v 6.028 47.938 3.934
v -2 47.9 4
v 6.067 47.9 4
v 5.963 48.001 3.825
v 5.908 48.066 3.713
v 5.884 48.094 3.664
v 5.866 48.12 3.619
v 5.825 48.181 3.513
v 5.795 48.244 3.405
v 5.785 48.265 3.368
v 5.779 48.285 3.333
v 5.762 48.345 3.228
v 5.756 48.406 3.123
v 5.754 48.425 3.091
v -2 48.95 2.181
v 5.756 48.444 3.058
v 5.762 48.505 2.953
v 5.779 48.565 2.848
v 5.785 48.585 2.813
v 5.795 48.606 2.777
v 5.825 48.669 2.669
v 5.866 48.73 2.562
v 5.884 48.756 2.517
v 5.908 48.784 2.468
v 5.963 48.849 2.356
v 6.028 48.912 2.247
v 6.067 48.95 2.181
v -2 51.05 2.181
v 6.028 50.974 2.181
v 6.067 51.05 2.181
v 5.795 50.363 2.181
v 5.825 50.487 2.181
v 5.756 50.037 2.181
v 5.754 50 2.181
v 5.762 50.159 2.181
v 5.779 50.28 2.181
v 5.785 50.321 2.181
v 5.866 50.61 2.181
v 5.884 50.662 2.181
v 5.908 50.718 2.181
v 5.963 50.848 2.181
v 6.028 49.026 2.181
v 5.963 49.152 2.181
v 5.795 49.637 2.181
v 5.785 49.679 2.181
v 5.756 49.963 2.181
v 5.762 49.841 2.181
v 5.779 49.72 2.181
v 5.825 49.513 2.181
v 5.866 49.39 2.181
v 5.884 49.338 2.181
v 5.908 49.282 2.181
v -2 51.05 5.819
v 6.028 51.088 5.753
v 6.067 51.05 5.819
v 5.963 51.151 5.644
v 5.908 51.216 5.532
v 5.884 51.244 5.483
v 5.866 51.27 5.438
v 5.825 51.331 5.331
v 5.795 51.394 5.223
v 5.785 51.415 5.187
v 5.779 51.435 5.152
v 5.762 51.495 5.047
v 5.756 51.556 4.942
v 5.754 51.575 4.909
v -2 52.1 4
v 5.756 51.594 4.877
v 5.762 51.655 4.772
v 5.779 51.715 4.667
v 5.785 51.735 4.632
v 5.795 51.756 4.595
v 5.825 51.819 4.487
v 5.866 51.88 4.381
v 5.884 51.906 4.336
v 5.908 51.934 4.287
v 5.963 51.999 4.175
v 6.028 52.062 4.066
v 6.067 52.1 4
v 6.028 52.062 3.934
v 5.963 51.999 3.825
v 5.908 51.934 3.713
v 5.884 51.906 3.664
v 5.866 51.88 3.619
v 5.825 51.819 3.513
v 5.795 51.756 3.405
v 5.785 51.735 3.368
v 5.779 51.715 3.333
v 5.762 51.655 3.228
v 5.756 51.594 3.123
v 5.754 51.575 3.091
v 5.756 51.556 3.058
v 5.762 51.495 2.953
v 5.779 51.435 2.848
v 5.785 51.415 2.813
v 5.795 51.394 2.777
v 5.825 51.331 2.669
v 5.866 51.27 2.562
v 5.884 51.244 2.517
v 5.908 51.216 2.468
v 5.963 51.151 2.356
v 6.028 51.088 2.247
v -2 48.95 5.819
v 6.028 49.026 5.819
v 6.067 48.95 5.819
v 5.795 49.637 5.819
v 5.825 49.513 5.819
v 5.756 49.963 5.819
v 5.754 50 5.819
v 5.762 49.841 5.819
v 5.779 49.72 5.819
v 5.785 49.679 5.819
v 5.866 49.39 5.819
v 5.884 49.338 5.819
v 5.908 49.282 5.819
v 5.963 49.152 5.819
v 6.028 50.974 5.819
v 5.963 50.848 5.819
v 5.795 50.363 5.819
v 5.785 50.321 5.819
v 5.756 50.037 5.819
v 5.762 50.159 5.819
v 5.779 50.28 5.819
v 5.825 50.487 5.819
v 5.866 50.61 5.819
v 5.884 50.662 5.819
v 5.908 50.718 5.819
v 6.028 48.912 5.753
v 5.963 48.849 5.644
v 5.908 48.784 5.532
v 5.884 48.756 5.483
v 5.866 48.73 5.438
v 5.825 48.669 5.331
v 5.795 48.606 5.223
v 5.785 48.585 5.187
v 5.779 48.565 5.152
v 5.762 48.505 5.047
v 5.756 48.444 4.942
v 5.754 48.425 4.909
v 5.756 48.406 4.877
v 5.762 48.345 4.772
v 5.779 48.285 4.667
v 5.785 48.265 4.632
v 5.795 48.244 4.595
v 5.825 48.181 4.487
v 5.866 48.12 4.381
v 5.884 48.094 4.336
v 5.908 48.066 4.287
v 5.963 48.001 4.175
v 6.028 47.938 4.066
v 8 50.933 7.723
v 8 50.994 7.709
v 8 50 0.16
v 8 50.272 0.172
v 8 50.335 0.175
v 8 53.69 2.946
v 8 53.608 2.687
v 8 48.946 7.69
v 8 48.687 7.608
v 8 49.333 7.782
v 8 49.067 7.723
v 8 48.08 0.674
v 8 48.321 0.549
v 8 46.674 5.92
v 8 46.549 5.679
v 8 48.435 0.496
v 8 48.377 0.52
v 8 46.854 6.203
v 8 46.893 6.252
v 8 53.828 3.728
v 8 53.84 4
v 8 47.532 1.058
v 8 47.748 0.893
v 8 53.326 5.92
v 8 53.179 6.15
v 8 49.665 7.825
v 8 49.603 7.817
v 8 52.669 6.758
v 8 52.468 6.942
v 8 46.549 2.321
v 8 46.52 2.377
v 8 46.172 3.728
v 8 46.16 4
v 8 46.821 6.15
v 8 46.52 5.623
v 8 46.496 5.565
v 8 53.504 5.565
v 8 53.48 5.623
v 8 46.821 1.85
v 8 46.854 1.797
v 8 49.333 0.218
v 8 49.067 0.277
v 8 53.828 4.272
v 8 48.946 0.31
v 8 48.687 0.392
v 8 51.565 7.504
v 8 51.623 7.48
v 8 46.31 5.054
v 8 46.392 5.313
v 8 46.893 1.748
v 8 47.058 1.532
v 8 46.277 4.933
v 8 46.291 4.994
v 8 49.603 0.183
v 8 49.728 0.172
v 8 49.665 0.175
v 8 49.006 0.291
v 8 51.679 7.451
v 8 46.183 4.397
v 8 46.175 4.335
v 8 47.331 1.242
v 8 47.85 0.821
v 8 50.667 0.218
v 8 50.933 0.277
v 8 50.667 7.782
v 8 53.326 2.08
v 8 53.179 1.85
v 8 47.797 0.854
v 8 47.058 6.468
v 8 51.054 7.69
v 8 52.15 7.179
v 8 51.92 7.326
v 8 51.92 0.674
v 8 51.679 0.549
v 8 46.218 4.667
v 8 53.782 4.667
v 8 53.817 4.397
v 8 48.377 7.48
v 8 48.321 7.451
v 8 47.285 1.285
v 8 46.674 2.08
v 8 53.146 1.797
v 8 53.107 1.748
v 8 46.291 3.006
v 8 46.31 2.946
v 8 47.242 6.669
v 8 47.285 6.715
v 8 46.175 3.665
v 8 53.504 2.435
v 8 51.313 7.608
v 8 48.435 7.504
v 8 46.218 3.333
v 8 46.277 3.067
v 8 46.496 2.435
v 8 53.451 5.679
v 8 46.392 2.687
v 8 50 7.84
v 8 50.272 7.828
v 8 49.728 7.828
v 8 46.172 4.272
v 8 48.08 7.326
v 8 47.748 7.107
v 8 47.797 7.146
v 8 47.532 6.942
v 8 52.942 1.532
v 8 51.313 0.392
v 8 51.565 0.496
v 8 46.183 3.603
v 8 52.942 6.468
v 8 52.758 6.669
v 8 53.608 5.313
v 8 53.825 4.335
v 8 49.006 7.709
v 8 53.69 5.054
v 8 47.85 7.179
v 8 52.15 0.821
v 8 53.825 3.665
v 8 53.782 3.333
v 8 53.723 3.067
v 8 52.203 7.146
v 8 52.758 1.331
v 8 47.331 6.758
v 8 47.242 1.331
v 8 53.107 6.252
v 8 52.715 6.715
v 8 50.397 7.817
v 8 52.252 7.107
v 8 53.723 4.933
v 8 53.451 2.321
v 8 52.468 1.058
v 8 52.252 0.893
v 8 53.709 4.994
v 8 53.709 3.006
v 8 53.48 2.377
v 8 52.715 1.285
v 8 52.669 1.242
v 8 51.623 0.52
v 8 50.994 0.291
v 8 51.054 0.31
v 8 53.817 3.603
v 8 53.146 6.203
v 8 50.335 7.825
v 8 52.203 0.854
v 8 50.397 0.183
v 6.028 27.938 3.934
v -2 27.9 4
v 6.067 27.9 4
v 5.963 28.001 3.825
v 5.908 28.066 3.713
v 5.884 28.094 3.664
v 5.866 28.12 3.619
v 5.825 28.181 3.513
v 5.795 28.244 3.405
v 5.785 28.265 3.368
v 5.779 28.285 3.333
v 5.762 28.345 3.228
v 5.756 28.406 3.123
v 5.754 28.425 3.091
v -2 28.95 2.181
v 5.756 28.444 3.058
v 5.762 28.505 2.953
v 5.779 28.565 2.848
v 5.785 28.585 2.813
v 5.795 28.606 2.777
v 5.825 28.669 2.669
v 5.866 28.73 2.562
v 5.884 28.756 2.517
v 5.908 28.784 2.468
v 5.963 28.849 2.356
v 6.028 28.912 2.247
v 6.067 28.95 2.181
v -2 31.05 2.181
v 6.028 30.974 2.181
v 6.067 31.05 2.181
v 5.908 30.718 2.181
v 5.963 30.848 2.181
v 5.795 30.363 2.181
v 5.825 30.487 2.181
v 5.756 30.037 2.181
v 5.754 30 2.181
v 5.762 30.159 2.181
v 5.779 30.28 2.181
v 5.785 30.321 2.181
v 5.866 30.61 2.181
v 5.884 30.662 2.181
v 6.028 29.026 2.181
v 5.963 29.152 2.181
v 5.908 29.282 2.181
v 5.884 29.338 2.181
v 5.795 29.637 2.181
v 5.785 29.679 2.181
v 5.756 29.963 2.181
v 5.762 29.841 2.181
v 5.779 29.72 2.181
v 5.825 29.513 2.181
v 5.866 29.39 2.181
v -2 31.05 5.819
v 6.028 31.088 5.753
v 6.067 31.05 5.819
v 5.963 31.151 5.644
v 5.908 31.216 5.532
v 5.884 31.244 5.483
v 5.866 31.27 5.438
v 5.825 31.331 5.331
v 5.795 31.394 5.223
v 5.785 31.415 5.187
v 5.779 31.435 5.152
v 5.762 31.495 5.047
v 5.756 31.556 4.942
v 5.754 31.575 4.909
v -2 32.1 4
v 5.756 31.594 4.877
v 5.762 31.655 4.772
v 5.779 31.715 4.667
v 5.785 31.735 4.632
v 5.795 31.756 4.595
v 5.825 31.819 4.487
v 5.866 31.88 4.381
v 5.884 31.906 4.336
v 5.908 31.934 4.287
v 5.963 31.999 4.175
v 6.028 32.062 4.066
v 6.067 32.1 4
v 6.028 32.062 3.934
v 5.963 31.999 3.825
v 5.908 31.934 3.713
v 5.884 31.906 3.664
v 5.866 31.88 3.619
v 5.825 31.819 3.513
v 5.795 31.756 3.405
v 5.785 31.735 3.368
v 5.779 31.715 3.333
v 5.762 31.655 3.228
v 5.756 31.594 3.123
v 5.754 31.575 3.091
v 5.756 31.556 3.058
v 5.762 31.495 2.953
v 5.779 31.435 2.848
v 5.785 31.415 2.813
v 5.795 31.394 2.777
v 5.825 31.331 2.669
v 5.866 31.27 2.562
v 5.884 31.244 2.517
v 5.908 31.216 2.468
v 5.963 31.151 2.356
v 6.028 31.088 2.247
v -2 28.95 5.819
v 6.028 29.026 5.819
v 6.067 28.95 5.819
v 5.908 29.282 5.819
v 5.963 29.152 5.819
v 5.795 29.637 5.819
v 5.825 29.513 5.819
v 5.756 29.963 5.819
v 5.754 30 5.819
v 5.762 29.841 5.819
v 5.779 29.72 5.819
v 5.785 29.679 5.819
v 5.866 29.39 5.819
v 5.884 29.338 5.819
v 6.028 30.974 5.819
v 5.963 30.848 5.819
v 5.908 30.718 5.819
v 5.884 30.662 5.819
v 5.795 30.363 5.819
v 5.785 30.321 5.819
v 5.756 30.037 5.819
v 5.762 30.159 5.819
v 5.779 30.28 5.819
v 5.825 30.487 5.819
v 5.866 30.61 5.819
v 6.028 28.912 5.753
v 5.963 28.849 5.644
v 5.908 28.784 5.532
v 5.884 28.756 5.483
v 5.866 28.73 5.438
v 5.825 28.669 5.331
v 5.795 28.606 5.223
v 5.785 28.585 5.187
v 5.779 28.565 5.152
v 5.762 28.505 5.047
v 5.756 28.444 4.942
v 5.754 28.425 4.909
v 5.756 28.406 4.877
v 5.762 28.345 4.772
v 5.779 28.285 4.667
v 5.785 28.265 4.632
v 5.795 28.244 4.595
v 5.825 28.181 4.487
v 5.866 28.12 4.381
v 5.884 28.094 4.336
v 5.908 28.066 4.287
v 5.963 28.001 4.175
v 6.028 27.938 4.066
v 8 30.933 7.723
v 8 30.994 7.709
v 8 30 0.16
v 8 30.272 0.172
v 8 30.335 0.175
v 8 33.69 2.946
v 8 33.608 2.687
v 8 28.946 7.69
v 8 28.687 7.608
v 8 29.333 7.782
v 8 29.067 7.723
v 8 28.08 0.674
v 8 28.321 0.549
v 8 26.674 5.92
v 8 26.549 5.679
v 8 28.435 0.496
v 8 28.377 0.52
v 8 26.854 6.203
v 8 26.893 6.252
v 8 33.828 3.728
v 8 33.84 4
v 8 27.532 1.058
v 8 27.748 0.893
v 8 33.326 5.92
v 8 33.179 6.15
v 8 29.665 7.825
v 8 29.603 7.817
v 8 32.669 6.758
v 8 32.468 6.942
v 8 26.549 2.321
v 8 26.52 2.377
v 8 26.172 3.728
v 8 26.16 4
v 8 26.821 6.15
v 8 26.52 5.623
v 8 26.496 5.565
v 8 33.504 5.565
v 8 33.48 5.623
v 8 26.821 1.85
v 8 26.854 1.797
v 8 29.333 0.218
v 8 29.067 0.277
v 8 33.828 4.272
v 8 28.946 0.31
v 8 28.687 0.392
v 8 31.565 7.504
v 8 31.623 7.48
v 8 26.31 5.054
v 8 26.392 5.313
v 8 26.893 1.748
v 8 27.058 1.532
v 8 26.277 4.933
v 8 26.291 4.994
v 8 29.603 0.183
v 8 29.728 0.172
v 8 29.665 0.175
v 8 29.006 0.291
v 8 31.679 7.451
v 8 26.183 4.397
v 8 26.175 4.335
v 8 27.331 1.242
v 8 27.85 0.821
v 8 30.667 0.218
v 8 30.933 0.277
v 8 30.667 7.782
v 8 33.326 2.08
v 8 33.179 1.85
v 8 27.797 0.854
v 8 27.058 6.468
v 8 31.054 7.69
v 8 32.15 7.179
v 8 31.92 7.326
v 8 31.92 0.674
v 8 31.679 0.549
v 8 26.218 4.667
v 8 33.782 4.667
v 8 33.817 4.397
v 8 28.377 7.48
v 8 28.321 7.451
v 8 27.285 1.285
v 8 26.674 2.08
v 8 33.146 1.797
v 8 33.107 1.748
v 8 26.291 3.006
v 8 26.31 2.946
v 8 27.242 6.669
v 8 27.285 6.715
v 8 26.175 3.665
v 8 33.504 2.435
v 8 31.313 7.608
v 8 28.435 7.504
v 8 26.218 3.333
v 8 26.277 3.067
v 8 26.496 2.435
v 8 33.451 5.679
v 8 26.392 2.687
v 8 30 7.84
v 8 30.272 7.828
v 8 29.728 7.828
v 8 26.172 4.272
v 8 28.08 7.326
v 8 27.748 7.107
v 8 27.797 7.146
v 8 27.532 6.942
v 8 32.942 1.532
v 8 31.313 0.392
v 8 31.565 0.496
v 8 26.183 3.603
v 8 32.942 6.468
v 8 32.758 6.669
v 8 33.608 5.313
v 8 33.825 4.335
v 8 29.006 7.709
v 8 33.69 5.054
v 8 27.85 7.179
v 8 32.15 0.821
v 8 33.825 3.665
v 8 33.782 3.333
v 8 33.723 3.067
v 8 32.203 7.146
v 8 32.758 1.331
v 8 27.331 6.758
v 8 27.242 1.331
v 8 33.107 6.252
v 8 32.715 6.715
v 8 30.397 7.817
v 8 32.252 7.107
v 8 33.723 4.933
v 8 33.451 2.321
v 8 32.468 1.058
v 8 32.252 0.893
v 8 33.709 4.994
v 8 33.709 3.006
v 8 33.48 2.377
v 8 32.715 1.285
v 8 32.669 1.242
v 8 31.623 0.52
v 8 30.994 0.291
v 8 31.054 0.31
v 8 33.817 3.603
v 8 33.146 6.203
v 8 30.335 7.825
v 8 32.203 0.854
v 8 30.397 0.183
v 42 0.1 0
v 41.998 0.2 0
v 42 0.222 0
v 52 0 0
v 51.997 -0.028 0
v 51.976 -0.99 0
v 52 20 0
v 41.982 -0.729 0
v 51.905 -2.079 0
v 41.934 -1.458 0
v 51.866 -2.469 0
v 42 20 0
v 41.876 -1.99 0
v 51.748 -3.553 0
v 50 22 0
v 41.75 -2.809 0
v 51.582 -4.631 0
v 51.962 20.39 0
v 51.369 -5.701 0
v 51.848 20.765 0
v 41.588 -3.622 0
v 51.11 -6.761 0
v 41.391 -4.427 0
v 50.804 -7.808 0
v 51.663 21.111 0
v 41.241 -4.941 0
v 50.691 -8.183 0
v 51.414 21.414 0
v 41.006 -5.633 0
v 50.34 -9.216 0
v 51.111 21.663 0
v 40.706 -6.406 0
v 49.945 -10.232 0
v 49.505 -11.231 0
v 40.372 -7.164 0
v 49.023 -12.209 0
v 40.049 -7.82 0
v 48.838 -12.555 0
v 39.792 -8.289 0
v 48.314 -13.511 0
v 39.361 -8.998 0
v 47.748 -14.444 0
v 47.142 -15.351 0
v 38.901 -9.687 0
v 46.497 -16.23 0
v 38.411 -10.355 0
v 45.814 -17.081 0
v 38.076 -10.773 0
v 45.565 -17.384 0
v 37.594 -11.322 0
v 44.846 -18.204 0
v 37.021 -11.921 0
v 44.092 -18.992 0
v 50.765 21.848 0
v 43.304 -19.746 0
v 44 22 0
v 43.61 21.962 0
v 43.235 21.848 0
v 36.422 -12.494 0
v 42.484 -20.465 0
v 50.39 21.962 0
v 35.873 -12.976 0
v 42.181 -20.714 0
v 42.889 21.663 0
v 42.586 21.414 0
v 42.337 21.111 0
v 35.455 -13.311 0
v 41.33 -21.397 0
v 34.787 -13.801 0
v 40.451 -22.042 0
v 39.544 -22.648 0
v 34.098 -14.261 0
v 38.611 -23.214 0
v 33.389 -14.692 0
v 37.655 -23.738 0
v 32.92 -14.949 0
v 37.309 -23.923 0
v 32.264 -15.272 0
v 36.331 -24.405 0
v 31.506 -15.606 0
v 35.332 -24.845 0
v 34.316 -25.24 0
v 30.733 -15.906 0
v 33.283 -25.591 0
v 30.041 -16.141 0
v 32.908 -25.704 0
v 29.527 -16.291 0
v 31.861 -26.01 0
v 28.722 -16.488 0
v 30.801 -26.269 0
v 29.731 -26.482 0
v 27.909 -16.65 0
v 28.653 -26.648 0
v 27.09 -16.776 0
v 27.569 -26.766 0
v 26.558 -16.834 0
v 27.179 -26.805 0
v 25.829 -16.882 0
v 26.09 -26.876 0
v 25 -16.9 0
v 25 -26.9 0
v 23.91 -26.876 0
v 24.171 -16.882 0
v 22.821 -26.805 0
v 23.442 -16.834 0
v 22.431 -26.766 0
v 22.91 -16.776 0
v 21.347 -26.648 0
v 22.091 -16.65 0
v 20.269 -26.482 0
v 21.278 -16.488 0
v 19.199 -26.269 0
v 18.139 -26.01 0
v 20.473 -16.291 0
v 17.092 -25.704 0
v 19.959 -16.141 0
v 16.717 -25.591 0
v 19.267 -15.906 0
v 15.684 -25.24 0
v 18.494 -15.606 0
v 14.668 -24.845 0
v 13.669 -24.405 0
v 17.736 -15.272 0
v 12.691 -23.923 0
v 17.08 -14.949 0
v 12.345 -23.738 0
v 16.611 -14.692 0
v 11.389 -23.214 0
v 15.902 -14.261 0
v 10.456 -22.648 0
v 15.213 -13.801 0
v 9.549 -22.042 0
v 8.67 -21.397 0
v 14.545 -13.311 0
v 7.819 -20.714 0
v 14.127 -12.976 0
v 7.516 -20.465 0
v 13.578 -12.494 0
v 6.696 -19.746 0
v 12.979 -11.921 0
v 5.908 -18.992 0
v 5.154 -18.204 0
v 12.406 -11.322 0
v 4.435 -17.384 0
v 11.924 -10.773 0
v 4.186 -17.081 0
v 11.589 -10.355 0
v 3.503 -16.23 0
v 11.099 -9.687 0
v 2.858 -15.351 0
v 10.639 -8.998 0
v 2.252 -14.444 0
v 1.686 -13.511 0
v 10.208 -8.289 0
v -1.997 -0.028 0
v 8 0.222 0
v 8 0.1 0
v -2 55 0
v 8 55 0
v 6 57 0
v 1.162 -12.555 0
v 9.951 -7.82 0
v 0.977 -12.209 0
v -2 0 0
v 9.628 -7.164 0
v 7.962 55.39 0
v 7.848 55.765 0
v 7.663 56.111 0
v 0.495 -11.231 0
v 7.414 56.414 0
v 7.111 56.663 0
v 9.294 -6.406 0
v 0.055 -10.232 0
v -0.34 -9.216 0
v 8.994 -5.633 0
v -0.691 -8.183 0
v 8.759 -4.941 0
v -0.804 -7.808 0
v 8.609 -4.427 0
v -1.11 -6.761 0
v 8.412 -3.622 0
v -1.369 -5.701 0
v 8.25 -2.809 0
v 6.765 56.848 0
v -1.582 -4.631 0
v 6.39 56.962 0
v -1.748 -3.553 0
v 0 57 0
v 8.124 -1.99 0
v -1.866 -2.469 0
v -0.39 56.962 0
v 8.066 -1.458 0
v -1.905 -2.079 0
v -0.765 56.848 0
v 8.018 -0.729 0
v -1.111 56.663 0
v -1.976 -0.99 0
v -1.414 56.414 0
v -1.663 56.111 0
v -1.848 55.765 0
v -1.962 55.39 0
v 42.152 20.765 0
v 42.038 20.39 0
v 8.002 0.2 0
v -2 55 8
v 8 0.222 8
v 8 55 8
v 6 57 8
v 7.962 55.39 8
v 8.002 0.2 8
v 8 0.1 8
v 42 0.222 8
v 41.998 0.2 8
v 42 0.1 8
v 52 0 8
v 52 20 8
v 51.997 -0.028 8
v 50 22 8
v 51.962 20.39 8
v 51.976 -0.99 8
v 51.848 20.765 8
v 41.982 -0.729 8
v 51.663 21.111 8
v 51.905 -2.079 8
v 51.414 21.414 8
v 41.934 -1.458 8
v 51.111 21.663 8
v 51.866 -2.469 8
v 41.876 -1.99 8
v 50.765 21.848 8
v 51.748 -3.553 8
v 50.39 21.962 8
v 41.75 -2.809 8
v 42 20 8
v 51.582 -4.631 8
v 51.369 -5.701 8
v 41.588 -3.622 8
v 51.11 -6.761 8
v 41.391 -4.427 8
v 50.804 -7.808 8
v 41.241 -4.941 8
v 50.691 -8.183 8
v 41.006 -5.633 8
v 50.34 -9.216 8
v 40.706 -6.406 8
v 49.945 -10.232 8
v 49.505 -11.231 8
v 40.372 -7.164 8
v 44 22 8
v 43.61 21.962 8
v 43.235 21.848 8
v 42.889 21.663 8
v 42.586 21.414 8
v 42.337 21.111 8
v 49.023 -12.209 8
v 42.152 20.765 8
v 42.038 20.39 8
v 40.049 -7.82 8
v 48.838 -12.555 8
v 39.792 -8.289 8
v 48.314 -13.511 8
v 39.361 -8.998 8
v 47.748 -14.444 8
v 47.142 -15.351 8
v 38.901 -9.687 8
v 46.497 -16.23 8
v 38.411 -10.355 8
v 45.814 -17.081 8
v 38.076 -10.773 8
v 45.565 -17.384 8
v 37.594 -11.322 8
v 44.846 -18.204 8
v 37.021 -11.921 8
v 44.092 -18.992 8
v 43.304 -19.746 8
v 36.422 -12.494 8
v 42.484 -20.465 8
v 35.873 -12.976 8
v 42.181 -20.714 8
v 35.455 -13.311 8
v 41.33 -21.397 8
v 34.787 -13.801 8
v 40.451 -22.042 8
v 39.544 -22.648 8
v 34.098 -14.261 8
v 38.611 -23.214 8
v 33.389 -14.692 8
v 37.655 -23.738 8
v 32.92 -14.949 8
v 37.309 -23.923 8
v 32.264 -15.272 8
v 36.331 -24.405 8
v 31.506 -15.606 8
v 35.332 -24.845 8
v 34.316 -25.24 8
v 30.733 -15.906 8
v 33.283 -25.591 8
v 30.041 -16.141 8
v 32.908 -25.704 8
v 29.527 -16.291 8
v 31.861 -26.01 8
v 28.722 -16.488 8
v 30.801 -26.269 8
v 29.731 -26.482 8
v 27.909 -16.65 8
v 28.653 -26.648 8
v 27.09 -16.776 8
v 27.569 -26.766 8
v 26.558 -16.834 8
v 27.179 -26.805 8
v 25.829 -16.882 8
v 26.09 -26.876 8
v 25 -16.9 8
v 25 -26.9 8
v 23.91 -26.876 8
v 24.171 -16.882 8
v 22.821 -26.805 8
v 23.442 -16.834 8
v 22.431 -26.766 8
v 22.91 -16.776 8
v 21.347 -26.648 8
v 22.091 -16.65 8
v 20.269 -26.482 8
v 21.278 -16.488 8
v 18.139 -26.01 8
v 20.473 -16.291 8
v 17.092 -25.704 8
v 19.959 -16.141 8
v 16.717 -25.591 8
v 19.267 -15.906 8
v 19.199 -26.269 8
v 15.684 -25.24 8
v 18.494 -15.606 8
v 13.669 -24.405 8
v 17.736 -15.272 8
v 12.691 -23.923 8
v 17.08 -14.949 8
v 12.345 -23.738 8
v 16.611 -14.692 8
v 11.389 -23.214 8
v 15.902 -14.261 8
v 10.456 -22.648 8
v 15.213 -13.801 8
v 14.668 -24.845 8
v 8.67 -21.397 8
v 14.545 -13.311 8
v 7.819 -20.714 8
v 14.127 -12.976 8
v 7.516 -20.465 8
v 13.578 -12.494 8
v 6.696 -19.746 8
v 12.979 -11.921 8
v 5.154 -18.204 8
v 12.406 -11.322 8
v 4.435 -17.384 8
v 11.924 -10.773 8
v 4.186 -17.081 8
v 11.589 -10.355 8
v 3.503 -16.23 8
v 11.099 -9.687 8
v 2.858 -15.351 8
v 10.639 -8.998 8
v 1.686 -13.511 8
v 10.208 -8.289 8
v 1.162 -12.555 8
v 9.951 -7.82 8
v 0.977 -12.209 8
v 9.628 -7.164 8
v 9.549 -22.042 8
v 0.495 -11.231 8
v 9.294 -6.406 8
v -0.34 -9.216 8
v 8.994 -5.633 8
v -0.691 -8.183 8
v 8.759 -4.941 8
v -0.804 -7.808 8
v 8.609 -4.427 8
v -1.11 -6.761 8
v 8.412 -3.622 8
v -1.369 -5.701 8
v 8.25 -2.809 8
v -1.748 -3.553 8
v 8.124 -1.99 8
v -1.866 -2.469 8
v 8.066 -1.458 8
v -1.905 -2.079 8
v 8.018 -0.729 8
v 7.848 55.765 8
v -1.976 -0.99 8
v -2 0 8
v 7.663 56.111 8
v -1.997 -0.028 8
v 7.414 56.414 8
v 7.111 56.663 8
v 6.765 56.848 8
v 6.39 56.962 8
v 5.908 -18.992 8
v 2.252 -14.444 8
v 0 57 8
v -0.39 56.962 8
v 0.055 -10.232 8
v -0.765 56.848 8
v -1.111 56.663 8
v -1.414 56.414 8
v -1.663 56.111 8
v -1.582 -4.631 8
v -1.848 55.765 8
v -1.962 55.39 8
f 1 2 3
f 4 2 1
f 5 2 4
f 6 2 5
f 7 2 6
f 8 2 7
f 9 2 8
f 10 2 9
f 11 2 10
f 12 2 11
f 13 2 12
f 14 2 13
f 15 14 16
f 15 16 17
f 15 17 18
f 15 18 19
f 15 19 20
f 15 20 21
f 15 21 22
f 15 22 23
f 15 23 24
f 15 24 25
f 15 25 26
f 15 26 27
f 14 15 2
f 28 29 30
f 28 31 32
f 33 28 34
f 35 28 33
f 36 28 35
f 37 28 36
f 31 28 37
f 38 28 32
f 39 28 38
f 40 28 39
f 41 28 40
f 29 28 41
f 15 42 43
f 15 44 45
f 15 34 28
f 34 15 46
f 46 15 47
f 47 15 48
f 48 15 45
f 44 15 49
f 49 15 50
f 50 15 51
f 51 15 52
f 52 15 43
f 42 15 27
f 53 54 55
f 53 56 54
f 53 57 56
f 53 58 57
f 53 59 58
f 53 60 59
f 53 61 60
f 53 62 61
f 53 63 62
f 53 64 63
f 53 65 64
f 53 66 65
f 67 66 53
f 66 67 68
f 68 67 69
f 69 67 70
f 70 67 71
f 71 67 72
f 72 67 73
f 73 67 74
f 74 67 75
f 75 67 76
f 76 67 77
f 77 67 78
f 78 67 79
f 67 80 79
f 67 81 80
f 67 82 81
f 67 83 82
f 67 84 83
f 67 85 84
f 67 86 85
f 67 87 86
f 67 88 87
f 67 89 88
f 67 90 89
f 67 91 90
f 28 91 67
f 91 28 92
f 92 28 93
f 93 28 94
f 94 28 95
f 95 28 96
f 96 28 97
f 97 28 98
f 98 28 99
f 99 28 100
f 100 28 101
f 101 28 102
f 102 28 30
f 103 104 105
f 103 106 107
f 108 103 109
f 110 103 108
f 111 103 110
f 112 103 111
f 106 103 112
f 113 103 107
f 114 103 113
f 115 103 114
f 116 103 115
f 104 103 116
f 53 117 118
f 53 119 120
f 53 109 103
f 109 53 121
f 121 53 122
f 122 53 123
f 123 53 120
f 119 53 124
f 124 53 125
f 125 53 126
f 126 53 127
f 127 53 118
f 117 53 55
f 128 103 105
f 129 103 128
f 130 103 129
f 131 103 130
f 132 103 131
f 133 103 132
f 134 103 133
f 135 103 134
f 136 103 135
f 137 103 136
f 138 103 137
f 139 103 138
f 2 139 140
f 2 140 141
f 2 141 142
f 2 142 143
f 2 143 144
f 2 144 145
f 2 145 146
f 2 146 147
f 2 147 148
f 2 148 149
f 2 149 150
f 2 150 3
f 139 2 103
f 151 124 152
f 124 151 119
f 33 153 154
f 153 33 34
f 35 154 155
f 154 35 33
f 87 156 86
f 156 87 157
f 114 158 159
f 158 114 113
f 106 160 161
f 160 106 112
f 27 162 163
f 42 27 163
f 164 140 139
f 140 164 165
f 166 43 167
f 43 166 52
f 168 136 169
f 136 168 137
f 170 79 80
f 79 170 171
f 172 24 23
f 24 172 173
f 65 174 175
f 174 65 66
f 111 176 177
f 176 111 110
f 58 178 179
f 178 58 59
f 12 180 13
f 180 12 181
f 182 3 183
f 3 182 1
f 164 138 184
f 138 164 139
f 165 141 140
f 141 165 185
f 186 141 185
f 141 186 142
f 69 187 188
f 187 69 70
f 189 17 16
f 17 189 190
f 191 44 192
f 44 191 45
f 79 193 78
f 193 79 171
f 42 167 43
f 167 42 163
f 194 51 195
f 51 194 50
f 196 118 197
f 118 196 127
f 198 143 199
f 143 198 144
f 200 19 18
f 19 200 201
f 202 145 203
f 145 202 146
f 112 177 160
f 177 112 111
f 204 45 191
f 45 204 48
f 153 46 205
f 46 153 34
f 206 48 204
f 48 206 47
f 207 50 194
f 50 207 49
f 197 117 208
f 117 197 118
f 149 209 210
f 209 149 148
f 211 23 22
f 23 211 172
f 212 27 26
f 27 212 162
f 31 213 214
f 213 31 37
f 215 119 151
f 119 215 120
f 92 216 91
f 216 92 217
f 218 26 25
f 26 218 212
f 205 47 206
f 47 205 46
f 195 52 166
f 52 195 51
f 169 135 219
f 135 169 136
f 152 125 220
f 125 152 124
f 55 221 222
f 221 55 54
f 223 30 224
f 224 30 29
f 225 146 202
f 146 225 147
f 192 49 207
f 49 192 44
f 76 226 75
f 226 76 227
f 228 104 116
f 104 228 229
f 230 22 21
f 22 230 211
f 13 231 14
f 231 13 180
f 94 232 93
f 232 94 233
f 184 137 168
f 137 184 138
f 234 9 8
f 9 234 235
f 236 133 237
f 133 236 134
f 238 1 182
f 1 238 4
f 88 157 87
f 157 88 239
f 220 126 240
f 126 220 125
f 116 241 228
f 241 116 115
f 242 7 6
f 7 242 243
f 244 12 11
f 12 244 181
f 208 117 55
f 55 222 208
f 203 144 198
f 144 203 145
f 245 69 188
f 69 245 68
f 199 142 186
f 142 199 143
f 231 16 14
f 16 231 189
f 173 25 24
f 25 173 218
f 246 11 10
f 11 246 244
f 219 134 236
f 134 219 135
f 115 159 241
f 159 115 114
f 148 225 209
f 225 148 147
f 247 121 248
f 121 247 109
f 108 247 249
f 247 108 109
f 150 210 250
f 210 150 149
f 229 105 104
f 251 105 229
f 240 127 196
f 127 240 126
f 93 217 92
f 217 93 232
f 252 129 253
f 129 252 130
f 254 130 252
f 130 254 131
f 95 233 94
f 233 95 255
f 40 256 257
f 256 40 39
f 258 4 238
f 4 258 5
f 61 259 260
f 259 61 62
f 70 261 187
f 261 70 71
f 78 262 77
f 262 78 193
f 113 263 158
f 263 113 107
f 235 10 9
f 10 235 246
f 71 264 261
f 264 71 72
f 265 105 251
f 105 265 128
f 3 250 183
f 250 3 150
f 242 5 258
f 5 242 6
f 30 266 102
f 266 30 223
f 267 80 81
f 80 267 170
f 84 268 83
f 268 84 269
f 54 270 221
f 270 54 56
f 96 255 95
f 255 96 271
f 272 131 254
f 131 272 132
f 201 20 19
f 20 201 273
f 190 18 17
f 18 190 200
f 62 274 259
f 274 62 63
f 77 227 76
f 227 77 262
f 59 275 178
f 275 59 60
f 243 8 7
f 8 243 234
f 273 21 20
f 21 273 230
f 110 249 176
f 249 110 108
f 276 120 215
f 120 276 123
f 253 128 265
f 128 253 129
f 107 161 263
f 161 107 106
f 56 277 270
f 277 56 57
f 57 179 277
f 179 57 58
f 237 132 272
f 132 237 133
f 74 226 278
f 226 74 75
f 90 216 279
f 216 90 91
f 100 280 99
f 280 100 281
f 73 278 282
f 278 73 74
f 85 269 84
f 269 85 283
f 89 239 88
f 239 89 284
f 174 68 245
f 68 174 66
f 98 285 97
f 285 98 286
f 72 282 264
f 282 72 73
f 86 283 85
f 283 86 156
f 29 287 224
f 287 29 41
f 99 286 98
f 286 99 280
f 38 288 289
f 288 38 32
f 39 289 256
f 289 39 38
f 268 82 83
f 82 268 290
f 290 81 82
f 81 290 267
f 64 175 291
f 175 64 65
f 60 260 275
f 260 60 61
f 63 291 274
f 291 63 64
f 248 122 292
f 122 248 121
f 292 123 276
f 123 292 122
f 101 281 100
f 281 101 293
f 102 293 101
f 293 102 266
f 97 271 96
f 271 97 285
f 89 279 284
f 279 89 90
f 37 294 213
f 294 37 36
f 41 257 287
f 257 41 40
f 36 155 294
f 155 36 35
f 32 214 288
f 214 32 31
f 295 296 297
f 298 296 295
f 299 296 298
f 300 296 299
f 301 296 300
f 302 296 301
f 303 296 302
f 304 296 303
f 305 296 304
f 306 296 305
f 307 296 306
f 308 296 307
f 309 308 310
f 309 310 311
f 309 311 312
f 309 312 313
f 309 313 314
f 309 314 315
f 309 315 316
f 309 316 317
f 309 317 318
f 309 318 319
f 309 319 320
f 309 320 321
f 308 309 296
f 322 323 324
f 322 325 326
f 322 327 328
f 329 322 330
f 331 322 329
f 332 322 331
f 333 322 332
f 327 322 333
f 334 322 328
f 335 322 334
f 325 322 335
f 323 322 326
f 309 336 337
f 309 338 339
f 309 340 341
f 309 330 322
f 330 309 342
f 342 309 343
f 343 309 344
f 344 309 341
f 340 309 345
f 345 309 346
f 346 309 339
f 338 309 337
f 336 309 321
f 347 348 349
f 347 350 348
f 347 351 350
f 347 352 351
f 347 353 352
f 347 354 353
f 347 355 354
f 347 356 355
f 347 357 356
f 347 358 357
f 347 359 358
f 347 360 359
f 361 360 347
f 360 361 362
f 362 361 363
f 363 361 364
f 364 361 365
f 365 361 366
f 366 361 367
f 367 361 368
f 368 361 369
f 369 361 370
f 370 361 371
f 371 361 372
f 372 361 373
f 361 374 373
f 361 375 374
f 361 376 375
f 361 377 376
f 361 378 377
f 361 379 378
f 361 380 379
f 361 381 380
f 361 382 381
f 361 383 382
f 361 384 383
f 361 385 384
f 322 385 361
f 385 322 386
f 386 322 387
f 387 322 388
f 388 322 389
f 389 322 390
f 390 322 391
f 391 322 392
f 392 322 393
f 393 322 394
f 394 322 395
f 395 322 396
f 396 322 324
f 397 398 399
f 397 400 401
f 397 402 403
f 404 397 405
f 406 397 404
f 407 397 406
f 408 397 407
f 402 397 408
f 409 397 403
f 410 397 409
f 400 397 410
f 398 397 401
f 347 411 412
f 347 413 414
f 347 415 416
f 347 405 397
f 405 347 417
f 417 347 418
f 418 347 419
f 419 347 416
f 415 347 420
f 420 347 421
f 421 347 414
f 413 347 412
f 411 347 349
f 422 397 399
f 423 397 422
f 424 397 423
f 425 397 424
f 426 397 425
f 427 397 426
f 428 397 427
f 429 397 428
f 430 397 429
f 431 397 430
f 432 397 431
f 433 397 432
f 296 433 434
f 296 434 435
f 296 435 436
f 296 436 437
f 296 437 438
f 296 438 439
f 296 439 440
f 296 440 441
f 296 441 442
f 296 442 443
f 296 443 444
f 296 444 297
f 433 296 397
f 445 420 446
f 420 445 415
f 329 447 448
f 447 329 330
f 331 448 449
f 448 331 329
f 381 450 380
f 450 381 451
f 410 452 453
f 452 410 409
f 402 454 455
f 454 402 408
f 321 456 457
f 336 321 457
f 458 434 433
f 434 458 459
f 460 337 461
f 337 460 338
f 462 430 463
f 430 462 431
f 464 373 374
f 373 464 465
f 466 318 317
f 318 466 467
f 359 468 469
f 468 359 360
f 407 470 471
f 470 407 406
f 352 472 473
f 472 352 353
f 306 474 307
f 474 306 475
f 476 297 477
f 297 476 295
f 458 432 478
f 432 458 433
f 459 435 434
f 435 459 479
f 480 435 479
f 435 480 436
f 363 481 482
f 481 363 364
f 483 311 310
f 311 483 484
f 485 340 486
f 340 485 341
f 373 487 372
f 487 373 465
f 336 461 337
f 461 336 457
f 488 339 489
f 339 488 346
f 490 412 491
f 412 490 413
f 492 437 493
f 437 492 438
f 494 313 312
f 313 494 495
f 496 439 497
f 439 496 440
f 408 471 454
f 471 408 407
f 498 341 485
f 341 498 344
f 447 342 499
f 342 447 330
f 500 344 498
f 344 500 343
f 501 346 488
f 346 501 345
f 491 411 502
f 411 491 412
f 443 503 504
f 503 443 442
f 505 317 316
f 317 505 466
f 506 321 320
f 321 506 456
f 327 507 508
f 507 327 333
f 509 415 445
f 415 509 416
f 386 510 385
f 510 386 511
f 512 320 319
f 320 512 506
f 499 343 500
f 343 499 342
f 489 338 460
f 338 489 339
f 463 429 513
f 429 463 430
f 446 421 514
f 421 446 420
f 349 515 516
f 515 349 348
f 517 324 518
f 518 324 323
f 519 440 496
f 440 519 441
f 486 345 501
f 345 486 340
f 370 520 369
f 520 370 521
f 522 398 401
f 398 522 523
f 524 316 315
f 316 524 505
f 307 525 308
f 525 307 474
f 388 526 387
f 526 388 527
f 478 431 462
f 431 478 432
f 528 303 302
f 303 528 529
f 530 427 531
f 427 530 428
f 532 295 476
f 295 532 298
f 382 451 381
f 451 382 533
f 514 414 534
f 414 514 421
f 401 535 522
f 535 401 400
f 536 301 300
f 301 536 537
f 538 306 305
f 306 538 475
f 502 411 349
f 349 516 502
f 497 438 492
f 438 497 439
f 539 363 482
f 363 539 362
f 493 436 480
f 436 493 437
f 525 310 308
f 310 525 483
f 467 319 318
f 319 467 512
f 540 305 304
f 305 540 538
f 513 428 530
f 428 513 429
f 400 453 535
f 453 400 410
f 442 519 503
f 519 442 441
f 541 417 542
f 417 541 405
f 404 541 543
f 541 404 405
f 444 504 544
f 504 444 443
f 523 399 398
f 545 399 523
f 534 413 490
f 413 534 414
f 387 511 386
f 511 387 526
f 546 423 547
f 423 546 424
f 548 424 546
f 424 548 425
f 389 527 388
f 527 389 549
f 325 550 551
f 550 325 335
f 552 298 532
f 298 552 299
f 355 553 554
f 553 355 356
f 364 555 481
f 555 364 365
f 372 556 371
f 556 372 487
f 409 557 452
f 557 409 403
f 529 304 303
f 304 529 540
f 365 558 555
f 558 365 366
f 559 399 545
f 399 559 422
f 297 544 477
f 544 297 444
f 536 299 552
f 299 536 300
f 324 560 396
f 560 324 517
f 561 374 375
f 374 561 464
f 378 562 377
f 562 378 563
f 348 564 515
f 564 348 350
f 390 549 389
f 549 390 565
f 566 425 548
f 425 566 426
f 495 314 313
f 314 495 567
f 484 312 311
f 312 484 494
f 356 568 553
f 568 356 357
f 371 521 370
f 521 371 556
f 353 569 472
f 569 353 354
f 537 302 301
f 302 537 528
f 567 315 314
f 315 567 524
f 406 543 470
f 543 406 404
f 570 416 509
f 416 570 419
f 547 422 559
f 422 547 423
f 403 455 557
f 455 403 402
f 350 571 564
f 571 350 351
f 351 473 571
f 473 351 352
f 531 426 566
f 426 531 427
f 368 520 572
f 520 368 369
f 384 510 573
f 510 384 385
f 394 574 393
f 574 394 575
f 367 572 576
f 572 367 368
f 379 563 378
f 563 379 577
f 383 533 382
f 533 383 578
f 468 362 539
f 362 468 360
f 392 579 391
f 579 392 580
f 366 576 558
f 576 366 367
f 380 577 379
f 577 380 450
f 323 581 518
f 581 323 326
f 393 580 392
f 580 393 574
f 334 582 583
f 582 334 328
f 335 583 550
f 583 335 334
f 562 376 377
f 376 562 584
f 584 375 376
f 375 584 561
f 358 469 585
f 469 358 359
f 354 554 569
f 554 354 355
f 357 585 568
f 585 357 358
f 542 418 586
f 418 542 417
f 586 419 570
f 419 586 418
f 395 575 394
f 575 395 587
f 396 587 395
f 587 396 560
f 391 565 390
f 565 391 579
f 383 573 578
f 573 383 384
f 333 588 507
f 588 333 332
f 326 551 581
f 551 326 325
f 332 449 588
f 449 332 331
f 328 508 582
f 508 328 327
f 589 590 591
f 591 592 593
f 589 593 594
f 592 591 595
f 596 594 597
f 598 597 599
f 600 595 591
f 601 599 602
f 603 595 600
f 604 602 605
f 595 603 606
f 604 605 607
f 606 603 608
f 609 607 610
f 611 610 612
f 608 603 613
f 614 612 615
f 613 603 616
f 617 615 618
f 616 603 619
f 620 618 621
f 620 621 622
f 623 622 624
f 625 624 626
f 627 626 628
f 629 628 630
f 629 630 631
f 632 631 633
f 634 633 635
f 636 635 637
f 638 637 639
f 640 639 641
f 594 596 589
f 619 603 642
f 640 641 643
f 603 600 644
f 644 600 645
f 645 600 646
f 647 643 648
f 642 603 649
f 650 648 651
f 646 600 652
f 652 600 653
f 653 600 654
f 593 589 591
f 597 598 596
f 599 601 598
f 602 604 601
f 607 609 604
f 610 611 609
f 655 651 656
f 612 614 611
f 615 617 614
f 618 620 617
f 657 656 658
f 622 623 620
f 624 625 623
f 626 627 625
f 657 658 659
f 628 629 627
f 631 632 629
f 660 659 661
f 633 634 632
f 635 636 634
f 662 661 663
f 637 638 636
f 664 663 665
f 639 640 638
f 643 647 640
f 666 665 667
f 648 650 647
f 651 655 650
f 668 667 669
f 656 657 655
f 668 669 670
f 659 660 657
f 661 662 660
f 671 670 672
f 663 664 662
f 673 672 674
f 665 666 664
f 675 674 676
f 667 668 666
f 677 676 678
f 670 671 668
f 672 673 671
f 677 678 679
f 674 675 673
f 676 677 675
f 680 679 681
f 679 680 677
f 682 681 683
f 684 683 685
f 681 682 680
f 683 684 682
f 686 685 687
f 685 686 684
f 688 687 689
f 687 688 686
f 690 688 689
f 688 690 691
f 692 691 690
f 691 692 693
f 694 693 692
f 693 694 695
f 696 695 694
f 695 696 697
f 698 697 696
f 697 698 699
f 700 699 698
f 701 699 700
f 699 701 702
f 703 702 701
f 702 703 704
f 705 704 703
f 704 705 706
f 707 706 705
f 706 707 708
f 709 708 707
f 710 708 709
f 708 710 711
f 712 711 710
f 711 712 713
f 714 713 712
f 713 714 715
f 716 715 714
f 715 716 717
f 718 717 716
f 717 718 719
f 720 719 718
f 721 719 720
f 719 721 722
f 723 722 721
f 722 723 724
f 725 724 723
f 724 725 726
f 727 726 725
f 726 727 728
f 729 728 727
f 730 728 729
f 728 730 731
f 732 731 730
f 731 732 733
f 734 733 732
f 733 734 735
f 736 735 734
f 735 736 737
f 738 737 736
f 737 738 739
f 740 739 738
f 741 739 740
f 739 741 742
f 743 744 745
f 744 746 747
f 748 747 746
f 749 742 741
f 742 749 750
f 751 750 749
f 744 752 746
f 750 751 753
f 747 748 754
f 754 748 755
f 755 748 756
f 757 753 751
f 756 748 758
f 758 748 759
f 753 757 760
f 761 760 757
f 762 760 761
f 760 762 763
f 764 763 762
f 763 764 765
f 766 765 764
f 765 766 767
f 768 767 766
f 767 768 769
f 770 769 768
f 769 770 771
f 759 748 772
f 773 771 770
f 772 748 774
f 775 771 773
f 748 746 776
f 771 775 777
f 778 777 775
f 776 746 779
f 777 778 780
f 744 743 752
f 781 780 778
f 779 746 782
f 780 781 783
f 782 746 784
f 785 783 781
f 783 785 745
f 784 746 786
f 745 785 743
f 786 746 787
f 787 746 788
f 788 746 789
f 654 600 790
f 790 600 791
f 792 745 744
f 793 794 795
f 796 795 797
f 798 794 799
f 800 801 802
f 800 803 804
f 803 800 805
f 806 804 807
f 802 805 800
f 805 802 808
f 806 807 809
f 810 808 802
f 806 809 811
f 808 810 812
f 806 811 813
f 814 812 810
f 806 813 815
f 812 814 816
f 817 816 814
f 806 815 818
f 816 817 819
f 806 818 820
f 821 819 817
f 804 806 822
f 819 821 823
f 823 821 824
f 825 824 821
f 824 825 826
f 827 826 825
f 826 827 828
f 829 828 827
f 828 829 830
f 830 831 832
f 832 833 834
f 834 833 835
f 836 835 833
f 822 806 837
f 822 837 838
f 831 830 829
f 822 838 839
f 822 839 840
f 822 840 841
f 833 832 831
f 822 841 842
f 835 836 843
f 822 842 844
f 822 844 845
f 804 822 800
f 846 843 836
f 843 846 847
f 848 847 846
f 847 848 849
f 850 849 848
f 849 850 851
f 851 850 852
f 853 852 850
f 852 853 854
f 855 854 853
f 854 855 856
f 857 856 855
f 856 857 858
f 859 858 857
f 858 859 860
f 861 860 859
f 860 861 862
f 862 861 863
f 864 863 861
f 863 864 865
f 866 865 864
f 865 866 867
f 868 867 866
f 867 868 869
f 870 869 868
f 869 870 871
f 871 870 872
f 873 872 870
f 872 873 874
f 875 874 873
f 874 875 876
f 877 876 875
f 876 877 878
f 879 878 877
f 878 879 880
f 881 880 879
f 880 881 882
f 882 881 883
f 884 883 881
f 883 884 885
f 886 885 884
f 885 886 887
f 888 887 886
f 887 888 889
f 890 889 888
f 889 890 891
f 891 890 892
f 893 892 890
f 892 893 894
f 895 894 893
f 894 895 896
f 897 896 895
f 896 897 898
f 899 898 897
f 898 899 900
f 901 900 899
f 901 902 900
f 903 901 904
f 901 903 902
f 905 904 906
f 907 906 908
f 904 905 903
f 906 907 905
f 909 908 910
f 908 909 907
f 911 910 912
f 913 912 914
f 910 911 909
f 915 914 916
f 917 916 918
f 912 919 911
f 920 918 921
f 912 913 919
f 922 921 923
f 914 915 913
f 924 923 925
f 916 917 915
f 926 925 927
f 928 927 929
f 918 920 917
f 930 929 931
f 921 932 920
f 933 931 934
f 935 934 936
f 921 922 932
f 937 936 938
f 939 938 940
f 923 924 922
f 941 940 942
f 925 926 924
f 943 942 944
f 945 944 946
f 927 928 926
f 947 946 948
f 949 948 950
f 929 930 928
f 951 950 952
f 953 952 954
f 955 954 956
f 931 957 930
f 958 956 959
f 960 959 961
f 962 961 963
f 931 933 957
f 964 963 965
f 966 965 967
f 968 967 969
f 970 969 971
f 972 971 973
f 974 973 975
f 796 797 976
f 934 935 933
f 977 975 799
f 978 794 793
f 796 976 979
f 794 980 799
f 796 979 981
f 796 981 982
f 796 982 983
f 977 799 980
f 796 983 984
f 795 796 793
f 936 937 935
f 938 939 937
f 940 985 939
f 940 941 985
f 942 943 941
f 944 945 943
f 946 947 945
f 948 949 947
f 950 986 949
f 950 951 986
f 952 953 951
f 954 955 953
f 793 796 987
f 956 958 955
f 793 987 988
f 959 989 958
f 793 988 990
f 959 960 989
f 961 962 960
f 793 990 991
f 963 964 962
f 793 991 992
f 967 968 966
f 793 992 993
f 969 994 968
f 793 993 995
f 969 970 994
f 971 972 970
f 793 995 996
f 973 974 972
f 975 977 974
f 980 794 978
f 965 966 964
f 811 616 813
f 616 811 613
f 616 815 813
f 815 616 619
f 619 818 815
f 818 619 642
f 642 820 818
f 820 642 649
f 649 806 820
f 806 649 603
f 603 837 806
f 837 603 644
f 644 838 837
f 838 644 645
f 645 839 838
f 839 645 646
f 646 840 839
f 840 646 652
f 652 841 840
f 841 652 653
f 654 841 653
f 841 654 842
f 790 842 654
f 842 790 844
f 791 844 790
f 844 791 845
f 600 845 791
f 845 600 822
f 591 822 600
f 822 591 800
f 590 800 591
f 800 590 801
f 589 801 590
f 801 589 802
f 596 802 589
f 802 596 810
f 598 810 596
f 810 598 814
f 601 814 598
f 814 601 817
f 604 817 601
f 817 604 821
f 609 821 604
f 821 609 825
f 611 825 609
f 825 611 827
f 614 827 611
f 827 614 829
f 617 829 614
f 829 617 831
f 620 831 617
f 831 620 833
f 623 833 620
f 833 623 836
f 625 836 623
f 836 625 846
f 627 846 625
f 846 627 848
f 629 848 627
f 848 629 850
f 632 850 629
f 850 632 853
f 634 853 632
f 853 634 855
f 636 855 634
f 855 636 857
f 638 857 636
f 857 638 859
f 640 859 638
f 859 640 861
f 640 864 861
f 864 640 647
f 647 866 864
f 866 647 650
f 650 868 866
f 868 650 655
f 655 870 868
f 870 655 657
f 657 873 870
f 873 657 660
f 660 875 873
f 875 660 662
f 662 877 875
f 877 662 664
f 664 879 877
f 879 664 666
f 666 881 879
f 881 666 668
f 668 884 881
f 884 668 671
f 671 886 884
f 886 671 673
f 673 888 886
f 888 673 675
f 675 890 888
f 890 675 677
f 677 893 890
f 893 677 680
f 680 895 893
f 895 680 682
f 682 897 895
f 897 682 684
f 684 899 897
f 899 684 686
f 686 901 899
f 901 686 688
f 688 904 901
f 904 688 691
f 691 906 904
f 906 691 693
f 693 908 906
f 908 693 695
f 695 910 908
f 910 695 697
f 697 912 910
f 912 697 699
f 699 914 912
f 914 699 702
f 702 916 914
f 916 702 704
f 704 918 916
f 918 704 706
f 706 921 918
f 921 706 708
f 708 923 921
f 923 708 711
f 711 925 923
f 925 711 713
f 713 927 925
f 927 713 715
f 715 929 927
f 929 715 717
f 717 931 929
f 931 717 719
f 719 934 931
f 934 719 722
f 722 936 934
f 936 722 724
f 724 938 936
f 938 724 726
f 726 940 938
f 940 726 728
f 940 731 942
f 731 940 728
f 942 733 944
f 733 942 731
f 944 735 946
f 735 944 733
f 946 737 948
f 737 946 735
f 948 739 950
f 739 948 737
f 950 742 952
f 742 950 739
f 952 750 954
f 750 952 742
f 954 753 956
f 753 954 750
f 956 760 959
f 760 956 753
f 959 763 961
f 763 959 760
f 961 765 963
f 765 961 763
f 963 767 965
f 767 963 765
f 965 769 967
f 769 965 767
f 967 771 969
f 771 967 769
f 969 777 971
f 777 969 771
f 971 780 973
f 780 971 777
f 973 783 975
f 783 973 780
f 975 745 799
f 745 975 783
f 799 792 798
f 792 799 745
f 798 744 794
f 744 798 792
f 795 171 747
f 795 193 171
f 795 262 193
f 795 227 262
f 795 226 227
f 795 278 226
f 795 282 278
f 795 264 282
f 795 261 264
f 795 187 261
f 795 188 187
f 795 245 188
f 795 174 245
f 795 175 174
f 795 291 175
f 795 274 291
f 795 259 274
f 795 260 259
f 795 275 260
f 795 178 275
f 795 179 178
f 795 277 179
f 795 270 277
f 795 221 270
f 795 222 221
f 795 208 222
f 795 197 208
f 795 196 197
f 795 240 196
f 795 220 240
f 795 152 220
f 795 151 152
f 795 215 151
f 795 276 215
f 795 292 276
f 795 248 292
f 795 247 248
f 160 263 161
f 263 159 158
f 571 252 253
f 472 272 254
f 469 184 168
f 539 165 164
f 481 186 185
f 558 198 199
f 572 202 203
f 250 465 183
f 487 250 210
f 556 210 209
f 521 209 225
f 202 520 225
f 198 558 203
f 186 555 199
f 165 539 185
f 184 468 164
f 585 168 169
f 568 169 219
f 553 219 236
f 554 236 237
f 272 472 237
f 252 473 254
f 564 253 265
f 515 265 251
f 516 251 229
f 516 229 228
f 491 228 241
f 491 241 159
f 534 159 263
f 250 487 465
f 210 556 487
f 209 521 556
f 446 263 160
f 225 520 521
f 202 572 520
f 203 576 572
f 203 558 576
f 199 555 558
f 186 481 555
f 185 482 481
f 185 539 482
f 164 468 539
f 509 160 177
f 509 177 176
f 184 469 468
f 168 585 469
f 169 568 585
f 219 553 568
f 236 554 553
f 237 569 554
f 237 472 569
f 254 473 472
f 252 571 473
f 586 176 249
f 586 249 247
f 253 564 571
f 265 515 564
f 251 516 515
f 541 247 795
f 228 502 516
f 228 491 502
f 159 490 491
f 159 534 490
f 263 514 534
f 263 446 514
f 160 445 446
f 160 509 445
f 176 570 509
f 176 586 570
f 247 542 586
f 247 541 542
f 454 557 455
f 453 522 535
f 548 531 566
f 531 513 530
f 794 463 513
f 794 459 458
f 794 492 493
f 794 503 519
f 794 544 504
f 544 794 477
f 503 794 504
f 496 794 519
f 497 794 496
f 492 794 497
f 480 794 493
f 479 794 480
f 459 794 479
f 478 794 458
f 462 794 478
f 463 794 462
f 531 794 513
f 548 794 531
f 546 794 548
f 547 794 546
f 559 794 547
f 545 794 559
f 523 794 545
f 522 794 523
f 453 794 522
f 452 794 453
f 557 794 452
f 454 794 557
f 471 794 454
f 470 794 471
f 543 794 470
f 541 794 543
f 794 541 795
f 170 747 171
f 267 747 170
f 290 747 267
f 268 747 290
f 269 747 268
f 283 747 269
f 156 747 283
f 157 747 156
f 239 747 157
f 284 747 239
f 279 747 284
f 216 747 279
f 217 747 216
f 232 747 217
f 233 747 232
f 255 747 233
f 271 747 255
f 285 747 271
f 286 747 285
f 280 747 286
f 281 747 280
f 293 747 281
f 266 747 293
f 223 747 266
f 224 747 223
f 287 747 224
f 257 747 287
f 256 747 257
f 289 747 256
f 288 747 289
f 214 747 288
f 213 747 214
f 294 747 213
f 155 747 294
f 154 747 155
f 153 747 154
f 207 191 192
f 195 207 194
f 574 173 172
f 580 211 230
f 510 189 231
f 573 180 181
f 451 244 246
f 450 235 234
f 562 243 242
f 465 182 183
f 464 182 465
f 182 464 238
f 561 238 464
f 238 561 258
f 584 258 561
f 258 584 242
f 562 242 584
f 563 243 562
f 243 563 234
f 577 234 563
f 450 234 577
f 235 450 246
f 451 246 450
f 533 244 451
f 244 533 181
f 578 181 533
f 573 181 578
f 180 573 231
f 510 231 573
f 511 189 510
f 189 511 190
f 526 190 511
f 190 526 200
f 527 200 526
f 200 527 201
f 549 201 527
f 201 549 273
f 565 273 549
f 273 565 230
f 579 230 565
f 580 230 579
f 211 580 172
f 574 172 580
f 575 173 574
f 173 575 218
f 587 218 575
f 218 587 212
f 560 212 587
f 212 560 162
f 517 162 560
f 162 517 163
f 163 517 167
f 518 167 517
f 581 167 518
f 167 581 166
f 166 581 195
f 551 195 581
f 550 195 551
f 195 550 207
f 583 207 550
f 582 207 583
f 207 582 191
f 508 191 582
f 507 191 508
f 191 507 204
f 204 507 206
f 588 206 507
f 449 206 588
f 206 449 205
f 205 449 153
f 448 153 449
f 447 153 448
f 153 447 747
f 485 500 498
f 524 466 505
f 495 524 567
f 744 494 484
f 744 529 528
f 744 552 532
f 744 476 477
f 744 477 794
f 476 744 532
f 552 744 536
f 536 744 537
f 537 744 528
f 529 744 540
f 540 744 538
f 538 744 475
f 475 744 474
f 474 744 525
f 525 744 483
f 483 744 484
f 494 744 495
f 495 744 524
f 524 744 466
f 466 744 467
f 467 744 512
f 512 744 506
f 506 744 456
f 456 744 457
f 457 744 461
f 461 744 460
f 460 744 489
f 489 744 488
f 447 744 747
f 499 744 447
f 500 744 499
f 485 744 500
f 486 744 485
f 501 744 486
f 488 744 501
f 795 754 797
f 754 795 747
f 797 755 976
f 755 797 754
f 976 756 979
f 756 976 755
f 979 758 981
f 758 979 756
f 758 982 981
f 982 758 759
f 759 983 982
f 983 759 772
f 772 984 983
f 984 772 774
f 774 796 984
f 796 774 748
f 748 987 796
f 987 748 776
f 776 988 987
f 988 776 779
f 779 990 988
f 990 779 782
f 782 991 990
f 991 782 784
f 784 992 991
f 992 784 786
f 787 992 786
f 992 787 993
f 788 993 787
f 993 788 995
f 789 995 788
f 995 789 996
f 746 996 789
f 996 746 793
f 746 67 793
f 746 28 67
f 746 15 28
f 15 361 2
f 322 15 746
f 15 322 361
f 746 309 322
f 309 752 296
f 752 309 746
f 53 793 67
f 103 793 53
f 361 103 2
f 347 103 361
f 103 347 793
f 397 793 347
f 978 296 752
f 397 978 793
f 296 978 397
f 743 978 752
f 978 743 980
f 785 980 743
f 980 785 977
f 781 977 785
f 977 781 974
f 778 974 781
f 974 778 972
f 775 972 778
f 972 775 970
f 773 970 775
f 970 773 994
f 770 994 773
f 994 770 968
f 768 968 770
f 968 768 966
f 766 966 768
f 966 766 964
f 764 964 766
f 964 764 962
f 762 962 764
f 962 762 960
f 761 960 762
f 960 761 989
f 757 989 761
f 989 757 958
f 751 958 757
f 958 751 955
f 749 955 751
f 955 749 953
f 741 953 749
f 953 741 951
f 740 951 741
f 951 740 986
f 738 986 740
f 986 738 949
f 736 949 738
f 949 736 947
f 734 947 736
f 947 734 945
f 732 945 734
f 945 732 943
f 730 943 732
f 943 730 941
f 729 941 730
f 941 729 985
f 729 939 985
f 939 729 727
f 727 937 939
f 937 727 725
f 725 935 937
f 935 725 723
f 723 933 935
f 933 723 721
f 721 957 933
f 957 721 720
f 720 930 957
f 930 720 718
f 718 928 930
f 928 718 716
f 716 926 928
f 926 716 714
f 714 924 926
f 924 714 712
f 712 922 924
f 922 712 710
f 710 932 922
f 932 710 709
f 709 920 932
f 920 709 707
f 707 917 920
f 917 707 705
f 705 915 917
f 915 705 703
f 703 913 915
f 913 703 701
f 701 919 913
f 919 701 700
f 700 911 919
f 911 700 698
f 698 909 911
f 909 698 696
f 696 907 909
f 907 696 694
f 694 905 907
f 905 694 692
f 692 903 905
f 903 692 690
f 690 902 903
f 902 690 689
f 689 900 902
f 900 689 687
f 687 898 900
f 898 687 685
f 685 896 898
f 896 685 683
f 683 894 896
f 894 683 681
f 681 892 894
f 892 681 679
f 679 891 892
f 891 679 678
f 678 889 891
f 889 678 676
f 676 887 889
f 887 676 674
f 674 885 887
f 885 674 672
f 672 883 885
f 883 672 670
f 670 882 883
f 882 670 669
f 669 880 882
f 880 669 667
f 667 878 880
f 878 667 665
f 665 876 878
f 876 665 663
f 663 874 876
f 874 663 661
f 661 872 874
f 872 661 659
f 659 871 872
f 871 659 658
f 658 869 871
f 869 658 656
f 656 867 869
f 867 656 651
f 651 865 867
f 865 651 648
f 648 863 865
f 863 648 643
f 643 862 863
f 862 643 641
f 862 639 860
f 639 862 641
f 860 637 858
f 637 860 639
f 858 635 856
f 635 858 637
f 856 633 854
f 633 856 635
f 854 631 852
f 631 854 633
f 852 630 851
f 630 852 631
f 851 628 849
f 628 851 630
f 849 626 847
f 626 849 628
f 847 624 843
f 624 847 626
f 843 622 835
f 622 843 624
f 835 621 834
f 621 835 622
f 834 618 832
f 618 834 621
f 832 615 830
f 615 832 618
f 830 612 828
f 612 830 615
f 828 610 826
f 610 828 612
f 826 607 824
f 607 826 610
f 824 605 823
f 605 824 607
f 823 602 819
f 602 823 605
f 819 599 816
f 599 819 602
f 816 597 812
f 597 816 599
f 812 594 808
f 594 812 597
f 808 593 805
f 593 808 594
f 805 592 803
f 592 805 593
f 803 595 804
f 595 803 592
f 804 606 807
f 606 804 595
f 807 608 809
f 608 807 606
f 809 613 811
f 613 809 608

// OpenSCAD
// simple parametric hook
// instruction poetry by byteborg, 2013
// karsten@rohrbach.de
// CC BY-NC 3.0

/* [Global] */
// How high should the hook be?
HEIGHT = 80; // [40:200]
// How deep should it reach?
DEPTH = 50;  // [15:150]
// Overall material thickness
ZTHICKNESS = 8; // [5:20]
// How long should the hook extend from the bottom half-circle?
LOOPLENGTH = 20;  // [0:100]
// Rounding factor
ROUNDING = 2; // [0.0:4.0]
// Mounting hole spacing
HOLESPACING = 20; // [0:100]
// Mounting hole diameter
HOLEDIA = 4; // [2.5, 3, 4, 5]

/* [Hidden] */
THICKNESS = ZTHICKNESS - ROUNDING;
q = .1;

print_part();

module screw() {
    rotate([0, 0, 30]) cylinder(h=15+ZTHICKNESS, r=(HOLEDIA+.2)/2, center=true, $fn=6);
    translate([0, 0, 15/2]) cylinder(h=5, r1=1.5, r2=6, center=true, $fn=72);
}

module print_part() {
    difference() {
        linear_extrude(height=ZTHICKNESS) {
            minkowski() {
                union() {
                    translate([0, 0]) square([THICKNESS, HEIGHT-DEPTH/2]);
                    translate([DEPTH-THICKNESS, 0]) square([THICKNESS, LOOPLENGTH]);
                    translate([DEPTH/2, q]) difference() {
                        circle(r=DEPTH/2, $fn=144);
                        translate([-DEPTH, q]) square([DEPTH*2, DEPTH]);
                        circle(r=DEPTH/2-THICKNESS, $fn=144);
                    }
                }
                circle(r=ROUNDING, $fn=32);
            }
        }
        translate([ZTHICKNESS - 7.6, HEIGHT-DEPTH/2-ZTHICKNESS/2-ROUNDING/2, ZTHICKNESS/2]) rotate([0, 90, 0]) {
            translate([0, 0, 0]) screw();
            translate([0, -HOLESPACING, 0]) screw();
        }
    }
}

//.
